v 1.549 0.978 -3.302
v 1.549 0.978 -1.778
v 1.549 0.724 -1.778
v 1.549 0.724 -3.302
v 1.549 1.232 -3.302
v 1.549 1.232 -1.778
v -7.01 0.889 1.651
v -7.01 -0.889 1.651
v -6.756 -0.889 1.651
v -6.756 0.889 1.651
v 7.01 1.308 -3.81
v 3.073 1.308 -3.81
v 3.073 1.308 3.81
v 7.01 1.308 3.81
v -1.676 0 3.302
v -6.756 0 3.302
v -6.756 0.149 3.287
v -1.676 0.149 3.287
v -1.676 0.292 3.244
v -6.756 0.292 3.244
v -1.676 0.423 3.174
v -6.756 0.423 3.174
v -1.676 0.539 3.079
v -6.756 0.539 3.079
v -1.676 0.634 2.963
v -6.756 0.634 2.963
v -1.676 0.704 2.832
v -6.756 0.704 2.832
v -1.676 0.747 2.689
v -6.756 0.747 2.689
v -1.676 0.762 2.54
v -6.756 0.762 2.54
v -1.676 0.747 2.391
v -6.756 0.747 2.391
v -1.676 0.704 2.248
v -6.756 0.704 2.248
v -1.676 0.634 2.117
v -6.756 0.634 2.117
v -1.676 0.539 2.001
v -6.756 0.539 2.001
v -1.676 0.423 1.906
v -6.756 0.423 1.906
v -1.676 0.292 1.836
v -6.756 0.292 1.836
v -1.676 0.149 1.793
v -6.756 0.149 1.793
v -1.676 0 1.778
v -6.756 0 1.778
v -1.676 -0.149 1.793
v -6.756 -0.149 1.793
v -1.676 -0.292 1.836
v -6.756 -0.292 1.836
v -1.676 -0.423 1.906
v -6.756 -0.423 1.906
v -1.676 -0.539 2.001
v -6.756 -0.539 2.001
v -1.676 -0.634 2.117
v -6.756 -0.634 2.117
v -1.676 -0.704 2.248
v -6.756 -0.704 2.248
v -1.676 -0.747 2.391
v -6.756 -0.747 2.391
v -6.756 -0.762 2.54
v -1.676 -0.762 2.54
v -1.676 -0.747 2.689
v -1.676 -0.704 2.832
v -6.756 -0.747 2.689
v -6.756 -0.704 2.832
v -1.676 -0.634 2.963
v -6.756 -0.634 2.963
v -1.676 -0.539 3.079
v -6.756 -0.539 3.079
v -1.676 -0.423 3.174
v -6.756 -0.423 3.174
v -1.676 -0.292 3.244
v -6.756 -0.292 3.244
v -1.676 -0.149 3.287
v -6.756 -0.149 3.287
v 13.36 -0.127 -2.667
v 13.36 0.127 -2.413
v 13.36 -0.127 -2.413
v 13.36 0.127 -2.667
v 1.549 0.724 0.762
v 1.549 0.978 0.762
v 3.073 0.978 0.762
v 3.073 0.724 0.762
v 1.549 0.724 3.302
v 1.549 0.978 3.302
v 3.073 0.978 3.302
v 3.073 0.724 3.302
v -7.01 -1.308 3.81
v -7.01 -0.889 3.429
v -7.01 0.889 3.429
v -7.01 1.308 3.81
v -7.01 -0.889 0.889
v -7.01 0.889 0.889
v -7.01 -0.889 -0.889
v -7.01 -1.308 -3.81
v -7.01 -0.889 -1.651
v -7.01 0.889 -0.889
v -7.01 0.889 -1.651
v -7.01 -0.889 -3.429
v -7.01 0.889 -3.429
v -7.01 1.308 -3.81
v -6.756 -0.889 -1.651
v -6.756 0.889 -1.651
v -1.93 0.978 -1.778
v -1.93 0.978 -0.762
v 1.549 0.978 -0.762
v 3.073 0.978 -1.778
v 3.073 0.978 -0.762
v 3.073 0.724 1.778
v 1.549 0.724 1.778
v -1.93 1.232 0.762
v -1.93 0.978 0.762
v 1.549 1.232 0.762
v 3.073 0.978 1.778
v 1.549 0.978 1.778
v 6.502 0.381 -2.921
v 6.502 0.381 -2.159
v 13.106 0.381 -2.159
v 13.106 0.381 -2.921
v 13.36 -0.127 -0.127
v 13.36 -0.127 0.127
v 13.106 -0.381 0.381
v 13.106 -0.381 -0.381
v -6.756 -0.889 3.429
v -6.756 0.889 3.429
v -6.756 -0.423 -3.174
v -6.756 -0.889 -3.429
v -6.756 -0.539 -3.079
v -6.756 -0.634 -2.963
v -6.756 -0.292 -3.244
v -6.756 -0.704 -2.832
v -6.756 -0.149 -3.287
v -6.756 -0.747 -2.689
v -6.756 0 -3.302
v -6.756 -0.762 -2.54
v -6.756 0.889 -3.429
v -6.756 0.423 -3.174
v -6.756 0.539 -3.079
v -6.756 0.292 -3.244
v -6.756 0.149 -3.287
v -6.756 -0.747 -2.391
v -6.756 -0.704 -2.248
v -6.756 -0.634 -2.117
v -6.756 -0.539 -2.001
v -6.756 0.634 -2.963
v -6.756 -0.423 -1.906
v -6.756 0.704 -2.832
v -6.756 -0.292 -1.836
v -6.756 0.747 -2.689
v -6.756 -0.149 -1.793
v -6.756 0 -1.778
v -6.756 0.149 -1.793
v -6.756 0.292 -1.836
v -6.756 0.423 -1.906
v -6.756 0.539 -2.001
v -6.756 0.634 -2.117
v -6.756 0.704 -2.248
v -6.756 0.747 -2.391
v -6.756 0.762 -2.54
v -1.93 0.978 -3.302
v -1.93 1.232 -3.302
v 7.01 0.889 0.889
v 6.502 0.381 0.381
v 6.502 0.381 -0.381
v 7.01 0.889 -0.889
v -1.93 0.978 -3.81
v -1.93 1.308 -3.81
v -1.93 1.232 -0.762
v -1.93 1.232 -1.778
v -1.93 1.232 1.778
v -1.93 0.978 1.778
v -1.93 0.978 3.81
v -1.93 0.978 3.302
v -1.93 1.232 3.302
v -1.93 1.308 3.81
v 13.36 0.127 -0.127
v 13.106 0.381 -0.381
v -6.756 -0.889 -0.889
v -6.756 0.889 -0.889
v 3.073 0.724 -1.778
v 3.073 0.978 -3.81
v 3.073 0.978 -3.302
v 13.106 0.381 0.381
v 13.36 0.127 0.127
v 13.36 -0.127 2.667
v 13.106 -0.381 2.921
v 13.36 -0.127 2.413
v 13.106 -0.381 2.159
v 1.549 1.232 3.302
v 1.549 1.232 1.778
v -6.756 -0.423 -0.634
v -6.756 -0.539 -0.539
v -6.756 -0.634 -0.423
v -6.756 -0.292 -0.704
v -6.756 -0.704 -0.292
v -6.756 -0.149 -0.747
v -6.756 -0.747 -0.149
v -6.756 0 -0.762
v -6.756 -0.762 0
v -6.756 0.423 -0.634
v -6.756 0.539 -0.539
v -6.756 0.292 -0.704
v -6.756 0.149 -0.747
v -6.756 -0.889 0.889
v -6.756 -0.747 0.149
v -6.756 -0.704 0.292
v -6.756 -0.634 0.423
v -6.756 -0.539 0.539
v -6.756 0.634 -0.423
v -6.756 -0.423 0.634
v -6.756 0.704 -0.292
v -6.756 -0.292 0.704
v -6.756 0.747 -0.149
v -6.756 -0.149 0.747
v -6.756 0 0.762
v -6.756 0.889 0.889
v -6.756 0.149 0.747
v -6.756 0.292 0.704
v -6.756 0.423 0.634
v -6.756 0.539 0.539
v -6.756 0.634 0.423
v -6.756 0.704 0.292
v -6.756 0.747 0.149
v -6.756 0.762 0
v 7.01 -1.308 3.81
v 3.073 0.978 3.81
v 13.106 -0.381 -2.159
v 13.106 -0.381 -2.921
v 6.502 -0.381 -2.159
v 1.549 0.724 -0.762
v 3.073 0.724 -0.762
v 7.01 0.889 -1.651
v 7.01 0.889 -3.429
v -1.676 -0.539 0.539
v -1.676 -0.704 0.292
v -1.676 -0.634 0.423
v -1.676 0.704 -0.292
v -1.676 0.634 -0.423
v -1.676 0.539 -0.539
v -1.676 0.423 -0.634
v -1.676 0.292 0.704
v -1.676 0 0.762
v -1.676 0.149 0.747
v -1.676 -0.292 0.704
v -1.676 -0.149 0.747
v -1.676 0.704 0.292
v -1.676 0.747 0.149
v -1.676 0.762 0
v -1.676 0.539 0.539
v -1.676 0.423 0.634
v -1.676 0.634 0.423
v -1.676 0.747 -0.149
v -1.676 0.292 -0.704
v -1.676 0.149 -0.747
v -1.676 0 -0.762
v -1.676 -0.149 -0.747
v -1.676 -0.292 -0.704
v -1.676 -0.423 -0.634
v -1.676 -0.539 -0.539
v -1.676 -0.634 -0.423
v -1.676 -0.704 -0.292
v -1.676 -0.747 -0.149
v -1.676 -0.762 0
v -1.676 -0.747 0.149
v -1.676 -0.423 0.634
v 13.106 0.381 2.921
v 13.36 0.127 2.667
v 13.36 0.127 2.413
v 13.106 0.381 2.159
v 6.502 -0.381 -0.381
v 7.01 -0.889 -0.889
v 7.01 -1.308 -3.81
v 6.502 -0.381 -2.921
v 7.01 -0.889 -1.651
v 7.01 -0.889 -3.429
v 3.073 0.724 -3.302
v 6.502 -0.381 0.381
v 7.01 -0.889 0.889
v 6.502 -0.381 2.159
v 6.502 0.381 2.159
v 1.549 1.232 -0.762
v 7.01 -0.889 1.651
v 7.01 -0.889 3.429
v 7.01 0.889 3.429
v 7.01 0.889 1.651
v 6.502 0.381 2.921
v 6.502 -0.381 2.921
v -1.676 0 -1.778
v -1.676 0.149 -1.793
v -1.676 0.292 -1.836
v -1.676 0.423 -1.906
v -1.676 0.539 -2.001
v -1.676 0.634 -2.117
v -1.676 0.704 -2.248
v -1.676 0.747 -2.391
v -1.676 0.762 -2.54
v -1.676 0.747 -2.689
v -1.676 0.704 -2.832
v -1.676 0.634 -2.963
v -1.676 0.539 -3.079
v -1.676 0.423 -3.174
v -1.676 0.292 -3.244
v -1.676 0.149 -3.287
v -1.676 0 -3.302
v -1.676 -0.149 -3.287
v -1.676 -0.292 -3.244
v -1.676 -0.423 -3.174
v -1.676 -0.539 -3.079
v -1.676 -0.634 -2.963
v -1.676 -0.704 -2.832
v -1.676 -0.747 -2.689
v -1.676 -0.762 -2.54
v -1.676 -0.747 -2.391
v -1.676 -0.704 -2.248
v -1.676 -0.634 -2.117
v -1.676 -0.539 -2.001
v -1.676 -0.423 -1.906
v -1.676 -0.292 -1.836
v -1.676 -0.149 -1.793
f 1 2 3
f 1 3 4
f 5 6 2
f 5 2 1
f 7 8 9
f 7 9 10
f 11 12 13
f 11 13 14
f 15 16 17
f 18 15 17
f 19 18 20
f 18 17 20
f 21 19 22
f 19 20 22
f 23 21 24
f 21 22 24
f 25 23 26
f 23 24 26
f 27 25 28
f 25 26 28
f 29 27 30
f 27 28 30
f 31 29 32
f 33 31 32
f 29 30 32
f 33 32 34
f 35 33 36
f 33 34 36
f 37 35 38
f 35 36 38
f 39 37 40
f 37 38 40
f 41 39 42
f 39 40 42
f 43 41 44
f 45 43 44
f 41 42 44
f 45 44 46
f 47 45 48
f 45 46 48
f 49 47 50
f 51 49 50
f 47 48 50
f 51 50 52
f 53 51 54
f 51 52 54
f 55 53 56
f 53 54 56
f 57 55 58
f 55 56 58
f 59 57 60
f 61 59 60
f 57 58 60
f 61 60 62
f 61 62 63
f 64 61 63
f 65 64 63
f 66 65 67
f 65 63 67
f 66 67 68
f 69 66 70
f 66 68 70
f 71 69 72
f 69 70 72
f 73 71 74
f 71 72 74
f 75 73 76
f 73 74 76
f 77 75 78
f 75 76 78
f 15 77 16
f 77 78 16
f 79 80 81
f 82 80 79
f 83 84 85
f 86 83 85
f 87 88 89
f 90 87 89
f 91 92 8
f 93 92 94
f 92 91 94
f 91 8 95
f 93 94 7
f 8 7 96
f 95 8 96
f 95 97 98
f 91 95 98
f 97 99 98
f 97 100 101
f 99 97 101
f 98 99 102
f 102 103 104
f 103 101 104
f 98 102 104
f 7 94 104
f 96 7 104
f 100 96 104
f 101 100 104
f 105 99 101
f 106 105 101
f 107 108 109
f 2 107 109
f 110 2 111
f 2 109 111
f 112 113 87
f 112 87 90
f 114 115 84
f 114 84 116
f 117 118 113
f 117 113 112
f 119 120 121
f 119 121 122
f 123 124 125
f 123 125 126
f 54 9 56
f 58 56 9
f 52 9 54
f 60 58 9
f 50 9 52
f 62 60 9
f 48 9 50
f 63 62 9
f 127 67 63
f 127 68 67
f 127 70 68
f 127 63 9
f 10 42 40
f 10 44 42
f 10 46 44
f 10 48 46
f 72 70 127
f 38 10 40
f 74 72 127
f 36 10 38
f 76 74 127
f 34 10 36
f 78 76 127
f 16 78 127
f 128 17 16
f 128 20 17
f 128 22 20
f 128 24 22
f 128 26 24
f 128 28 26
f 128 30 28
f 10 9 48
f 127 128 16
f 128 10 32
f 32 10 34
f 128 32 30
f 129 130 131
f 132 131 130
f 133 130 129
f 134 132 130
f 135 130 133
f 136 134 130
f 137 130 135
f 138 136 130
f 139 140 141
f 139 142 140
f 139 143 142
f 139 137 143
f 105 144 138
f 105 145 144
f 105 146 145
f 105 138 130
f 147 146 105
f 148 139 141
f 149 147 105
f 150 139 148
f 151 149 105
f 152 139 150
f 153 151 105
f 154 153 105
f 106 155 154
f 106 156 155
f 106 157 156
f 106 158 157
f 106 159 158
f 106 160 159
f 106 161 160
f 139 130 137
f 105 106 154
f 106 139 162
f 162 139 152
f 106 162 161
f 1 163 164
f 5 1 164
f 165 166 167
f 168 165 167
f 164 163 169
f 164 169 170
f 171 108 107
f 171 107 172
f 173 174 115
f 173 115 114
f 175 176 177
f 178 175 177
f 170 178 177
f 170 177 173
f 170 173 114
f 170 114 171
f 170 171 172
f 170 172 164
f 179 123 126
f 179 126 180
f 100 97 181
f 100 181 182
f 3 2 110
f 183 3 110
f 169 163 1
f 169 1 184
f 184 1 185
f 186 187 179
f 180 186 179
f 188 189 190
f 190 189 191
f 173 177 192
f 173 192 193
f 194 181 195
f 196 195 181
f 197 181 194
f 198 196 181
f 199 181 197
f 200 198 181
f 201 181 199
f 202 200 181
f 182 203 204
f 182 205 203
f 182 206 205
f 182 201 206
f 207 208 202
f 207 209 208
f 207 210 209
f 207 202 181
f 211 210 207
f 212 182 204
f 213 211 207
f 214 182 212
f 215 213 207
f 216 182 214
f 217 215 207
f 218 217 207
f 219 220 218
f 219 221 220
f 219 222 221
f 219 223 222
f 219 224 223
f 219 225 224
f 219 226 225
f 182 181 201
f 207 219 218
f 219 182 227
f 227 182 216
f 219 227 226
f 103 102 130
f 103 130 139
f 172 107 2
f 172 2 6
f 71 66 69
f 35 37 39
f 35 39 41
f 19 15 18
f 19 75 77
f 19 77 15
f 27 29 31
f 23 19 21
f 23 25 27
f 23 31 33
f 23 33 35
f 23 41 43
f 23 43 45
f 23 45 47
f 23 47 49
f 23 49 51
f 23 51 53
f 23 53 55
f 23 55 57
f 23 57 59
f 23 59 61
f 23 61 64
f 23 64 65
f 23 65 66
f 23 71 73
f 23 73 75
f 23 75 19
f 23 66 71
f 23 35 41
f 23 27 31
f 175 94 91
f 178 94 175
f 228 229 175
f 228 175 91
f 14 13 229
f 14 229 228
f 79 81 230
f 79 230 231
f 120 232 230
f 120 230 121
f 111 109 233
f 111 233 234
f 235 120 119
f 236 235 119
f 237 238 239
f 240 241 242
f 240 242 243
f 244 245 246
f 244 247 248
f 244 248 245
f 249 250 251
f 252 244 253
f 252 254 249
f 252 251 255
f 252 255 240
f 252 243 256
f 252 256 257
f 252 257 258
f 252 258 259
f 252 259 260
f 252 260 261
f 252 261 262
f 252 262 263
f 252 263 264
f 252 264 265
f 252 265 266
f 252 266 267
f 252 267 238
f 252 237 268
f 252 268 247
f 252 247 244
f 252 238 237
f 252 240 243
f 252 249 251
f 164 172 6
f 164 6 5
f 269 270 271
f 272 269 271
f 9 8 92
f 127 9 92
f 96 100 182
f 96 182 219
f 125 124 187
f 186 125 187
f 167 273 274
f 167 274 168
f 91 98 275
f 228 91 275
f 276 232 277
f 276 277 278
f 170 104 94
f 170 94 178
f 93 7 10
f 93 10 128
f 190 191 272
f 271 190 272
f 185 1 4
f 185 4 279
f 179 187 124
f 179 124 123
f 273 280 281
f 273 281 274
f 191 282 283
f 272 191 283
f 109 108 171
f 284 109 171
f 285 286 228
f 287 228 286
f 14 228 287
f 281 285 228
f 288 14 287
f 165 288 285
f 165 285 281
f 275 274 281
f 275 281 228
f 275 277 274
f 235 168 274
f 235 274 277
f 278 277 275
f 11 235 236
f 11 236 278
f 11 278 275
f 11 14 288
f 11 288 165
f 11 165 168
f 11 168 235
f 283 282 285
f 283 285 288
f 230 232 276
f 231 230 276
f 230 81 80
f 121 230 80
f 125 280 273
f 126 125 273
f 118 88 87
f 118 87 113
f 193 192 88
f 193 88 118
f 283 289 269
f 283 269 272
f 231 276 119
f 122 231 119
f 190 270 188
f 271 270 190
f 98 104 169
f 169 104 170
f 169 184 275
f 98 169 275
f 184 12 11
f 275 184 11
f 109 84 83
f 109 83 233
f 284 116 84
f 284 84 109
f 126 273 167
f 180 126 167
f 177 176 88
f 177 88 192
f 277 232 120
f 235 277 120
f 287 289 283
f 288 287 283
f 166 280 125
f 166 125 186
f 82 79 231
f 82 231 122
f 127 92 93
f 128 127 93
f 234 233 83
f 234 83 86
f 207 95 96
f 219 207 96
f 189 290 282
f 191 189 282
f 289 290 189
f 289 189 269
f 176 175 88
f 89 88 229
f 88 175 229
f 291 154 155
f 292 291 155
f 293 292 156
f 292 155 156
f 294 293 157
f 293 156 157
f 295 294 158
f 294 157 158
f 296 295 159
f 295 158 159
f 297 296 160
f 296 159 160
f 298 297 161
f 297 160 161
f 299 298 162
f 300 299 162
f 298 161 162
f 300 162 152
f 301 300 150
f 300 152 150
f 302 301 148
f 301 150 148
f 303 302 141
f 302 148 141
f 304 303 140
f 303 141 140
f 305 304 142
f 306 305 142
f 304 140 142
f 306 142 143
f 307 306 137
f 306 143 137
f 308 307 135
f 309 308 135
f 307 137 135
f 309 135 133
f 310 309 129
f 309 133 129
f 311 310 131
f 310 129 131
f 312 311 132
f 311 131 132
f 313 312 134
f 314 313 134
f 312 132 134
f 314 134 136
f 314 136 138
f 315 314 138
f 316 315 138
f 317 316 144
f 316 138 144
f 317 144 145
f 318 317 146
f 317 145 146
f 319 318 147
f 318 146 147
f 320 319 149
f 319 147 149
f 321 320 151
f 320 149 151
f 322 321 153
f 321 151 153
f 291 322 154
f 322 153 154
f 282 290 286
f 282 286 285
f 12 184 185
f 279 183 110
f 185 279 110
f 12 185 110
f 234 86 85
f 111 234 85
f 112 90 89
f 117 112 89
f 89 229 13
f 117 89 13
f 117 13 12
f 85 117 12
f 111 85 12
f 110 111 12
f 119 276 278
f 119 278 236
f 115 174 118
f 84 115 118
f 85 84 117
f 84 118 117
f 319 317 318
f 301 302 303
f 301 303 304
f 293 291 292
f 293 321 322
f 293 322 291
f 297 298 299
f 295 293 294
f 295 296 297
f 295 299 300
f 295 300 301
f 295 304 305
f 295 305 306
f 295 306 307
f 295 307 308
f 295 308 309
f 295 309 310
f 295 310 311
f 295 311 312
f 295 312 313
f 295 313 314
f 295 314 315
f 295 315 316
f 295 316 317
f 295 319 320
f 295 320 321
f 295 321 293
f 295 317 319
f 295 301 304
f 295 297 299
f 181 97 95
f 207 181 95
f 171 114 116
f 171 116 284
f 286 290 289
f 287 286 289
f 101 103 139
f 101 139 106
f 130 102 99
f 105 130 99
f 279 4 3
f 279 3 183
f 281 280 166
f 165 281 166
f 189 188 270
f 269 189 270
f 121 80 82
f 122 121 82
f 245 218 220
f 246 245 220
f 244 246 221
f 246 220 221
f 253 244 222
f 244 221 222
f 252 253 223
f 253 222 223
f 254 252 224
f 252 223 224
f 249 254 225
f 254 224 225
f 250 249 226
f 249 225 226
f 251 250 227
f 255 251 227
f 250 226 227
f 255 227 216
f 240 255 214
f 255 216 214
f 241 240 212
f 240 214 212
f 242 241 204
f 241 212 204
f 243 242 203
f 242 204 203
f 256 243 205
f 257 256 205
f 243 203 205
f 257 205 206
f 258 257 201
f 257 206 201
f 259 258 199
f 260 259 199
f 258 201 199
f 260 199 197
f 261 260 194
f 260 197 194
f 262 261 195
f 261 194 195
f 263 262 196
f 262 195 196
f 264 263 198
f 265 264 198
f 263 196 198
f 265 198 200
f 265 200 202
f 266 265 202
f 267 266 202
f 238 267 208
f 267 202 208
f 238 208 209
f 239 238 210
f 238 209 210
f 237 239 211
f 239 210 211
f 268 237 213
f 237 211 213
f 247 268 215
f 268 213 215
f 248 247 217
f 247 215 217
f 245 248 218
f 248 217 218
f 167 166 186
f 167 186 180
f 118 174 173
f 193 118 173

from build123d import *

# Parameters (mm, degrees)
SKETCH1_W           = 14.0208
SKETCH1_H           = 7.62
BOSS_EXTRUDE1_DEPTH = 1.3081
SKETCH2_W           = 0.762
SKETCH2_H           = 0.762
CUT_EXTRUDE1_DEPTH  = 6.35
CHAMFER1_SIZE       = 0.508
SKETCH3_W           = 1.778
SKETCH3_H           = 1.778
CUT_EXTRUDE2_DEPTH  = 0.254
SKETCH4_R           = 0.762
CUT_EXTRUDE3_DEPTH  = 5.08
SKETCH5_W           = 5.0038
SKETCH5_H           = 0.6604
CUT_EXTRUDE4_DEPTH  = 8.62
SKETCH6_W           = 1.524
SKETCH6_H           = 0.381
SKETCH6_H_2         = 0.762
SKETCH6_H_3         = 1.524
CUT_EXTRUDE5_DEPTH  = 0.254
SKETCH7_W           = 1.524
SKETCH7_H           = 0.254
BOSS_EXTRUDE2_DEPTH = 3.4798
SKETCH8_W           = 0.762
SKETCH8_H           = 0.762
BOSS_EXTRUDE3_DEPTH = 12.7
CHAMFER2_SIZE       = 0.254


with BuildPart() as part:
    # Sketch1 → Boss-Extrude1 (new body, symmetric)
    with BuildSketch(Plane(origin=(0, 0, 0), x_dir=(1, 0, 0), z_dir=(0, 1, 0))):
        Rectangle(SKETCH1_W, SKETCH1_H)
    extrude(amount=BOSS_EXTRUDE1_DEPTH, both=True)

    # Sketch2 → Cut-Extrude1 (cut)
    with BuildSketch(Plane(origin=(7.0104, 0, 0), x_dir=(0, 0, -1), z_dir=(1, 0, 0))):
        Rectangle(SKETCH2_W, SKETCH2_H)
        with Locations((-2.54, 0)):
            Rectangle(SKETCH2_W, SKETCH2_H)
        with Locations((2.54, 0)):
            Rectangle(SKETCH2_W, SKETCH2_H)
    extrude(amount=-CUT_EXTRUDE1_DEPTH, mode=Mode.SUBTRACT)

    # Chamfer1
    chamfer1_edges = [part.edges().sort_by_distance(p)[0] for p in [
        (7.0104, -0.381, 2.54),
        (7.0104, 0, 2.159),
        (7.0104, 0.381, 2.54),
        (7.0104, 0, 2.921),
        (7.0104, -0.381, 0),
        (7.0104, 0, -0.381),
        (7.0104, 0.381, 0),
        (7.0104, 0, 0.381),
        (7.0104, -0.381, -2.54),
        (7.0104, 0, -2.921),
        (7.0104, 0.381, -2.54),
        (7.0104, 0, -2.159),
    ]]
    chamfer(chamfer1_edges, length=CHAMFER1_SIZE)

    # Sketch3 → Cut-Extrude2 (cut)
    with BuildSketch(Plane.ZY.offset(7.0104)):
        with Locations((-2.54, 0)):
            Rectangle(SKETCH3_W, SKETCH3_H)
        Rectangle(SKETCH3_W, SKETCH3_H)
        with Locations((2.54, 0)):
            Rectangle(SKETCH3_W, SKETCH3_H)
    extrude(amount=-CUT_EXTRUDE2_DEPTH, mode=Mode.SUBTRACT)

    # Sketch4 → Cut-Extrude3 (cut)
    with BuildSketch(Plane.ZY.offset(6.7564)):
        with Locations((-2.54, 0)):
            Circle(SKETCH4_R)
        Circle(SKETCH4_R)
        with Locations((2.54, 0)):
            Circle(SKETCH4_R)
    extrude(amount=-CUT_EXTRUDE3_DEPTH, mode=Mode.SUBTRACT)

    # Sketch5 → Cut-Extrude4 (cut, through all)
    with BuildSketch(Plane.XY.offset(3.81)):
        with Locations((0.5715, 1.3081)):
            Rectangle(SKETCH5_W, SKETCH5_H)
    extrude(amount=-CUT_EXTRUDE4_DEPTH, mode=Mode.SUBTRACT)

    # Sketch6 → Cut-Extrude5 (cut)
    with BuildSketch(Plane(origin=(0, 0.9779, 0), x_dir=(1, 0, 0), z_dir=(0, 1, 0))):
        with Locations((2.3114, 3.1115)):
            Rectangle(SKETCH6_W, SKETCH6_H)
        with Locations((2.3114, 2.54)):
            Rectangle(SKETCH6_W, SKETCH6_H_2)
        with Locations((2.3114, 1.9685)):
            Rectangle(SKETCH6_W, SKETCH6_H)
        with Locations((2.3114, 0)):
            Rectangle(SKETCH6_W, SKETCH6_H_3)
        with Locations((2.3114, -2.54)):
            Rectangle(SKETCH6_W, SKETCH6_H_3)
    extrude(amount=-CUT_EXTRUDE5_DEPTH, mode=Mode.SUBTRACT)

    # Sketch7 → Boss-Extrude2 (add)
    with BuildSketch(Plane(origin=(-1.9304, 0, 0), x_dir=(0, 0, -1), z_dir=(1, 0, 0))):
        with Locations((2.54, 1.1049)):
            Rectangle(SKETCH7_W, SKETCH7_H)
        with Locations((0, 1.1049)):
            Rectangle(SKETCH7_W, SKETCH7_H)
        with Locations((-2.54, 1.1049)):
            Rectangle(SKETCH7_W, SKETCH7_H)
    extrude(amount=BOSS_EXTRUDE2_DEPTH)

    # Sketch8 → Boss-Extrude3 (add)
    with BuildSketch(Plane(origin=(0.6604, 0, 0), x_dir=(0, 0, -1), z_dir=(1, 0, 0))):
        with Locations((-2.54, 0)):
            Rectangle(SKETCH8_W, SKETCH8_H)
        Rectangle(SKETCH8_W, SKETCH8_H)
        with Locations((2.54, 0)):
            Rectangle(SKETCH8_W, SKETCH8_H)
    extrude(amount=BOSS_EXTRUDE3_DEPTH)

    # Chamfer2
    chamfer2_edges = [part.edges().sort_by_distance(p)[0] for p in [
        (13.3604, 0, 2.921),
        (13.3604, -0.381, 2.54),
        (13.3604, 0, 2.159),
        (13.3604, 0.381, 2.54),
        (13.3604, 0, 0.381),
        (13.3604, -0.381, 0),
        (13.3604, 0, -0.381),
        (13.3604, 0.381, 0),
        (13.3604, 0, -2.159),
        (13.3604, -0.381, -2.54),
        (13.3604, 0, -2.921),
        (13.3604, 0.381, -2.54),
    ]]
    chamfer(chamfer2_edges, length=CHAMFER2_SIZE)


solid = part.part
